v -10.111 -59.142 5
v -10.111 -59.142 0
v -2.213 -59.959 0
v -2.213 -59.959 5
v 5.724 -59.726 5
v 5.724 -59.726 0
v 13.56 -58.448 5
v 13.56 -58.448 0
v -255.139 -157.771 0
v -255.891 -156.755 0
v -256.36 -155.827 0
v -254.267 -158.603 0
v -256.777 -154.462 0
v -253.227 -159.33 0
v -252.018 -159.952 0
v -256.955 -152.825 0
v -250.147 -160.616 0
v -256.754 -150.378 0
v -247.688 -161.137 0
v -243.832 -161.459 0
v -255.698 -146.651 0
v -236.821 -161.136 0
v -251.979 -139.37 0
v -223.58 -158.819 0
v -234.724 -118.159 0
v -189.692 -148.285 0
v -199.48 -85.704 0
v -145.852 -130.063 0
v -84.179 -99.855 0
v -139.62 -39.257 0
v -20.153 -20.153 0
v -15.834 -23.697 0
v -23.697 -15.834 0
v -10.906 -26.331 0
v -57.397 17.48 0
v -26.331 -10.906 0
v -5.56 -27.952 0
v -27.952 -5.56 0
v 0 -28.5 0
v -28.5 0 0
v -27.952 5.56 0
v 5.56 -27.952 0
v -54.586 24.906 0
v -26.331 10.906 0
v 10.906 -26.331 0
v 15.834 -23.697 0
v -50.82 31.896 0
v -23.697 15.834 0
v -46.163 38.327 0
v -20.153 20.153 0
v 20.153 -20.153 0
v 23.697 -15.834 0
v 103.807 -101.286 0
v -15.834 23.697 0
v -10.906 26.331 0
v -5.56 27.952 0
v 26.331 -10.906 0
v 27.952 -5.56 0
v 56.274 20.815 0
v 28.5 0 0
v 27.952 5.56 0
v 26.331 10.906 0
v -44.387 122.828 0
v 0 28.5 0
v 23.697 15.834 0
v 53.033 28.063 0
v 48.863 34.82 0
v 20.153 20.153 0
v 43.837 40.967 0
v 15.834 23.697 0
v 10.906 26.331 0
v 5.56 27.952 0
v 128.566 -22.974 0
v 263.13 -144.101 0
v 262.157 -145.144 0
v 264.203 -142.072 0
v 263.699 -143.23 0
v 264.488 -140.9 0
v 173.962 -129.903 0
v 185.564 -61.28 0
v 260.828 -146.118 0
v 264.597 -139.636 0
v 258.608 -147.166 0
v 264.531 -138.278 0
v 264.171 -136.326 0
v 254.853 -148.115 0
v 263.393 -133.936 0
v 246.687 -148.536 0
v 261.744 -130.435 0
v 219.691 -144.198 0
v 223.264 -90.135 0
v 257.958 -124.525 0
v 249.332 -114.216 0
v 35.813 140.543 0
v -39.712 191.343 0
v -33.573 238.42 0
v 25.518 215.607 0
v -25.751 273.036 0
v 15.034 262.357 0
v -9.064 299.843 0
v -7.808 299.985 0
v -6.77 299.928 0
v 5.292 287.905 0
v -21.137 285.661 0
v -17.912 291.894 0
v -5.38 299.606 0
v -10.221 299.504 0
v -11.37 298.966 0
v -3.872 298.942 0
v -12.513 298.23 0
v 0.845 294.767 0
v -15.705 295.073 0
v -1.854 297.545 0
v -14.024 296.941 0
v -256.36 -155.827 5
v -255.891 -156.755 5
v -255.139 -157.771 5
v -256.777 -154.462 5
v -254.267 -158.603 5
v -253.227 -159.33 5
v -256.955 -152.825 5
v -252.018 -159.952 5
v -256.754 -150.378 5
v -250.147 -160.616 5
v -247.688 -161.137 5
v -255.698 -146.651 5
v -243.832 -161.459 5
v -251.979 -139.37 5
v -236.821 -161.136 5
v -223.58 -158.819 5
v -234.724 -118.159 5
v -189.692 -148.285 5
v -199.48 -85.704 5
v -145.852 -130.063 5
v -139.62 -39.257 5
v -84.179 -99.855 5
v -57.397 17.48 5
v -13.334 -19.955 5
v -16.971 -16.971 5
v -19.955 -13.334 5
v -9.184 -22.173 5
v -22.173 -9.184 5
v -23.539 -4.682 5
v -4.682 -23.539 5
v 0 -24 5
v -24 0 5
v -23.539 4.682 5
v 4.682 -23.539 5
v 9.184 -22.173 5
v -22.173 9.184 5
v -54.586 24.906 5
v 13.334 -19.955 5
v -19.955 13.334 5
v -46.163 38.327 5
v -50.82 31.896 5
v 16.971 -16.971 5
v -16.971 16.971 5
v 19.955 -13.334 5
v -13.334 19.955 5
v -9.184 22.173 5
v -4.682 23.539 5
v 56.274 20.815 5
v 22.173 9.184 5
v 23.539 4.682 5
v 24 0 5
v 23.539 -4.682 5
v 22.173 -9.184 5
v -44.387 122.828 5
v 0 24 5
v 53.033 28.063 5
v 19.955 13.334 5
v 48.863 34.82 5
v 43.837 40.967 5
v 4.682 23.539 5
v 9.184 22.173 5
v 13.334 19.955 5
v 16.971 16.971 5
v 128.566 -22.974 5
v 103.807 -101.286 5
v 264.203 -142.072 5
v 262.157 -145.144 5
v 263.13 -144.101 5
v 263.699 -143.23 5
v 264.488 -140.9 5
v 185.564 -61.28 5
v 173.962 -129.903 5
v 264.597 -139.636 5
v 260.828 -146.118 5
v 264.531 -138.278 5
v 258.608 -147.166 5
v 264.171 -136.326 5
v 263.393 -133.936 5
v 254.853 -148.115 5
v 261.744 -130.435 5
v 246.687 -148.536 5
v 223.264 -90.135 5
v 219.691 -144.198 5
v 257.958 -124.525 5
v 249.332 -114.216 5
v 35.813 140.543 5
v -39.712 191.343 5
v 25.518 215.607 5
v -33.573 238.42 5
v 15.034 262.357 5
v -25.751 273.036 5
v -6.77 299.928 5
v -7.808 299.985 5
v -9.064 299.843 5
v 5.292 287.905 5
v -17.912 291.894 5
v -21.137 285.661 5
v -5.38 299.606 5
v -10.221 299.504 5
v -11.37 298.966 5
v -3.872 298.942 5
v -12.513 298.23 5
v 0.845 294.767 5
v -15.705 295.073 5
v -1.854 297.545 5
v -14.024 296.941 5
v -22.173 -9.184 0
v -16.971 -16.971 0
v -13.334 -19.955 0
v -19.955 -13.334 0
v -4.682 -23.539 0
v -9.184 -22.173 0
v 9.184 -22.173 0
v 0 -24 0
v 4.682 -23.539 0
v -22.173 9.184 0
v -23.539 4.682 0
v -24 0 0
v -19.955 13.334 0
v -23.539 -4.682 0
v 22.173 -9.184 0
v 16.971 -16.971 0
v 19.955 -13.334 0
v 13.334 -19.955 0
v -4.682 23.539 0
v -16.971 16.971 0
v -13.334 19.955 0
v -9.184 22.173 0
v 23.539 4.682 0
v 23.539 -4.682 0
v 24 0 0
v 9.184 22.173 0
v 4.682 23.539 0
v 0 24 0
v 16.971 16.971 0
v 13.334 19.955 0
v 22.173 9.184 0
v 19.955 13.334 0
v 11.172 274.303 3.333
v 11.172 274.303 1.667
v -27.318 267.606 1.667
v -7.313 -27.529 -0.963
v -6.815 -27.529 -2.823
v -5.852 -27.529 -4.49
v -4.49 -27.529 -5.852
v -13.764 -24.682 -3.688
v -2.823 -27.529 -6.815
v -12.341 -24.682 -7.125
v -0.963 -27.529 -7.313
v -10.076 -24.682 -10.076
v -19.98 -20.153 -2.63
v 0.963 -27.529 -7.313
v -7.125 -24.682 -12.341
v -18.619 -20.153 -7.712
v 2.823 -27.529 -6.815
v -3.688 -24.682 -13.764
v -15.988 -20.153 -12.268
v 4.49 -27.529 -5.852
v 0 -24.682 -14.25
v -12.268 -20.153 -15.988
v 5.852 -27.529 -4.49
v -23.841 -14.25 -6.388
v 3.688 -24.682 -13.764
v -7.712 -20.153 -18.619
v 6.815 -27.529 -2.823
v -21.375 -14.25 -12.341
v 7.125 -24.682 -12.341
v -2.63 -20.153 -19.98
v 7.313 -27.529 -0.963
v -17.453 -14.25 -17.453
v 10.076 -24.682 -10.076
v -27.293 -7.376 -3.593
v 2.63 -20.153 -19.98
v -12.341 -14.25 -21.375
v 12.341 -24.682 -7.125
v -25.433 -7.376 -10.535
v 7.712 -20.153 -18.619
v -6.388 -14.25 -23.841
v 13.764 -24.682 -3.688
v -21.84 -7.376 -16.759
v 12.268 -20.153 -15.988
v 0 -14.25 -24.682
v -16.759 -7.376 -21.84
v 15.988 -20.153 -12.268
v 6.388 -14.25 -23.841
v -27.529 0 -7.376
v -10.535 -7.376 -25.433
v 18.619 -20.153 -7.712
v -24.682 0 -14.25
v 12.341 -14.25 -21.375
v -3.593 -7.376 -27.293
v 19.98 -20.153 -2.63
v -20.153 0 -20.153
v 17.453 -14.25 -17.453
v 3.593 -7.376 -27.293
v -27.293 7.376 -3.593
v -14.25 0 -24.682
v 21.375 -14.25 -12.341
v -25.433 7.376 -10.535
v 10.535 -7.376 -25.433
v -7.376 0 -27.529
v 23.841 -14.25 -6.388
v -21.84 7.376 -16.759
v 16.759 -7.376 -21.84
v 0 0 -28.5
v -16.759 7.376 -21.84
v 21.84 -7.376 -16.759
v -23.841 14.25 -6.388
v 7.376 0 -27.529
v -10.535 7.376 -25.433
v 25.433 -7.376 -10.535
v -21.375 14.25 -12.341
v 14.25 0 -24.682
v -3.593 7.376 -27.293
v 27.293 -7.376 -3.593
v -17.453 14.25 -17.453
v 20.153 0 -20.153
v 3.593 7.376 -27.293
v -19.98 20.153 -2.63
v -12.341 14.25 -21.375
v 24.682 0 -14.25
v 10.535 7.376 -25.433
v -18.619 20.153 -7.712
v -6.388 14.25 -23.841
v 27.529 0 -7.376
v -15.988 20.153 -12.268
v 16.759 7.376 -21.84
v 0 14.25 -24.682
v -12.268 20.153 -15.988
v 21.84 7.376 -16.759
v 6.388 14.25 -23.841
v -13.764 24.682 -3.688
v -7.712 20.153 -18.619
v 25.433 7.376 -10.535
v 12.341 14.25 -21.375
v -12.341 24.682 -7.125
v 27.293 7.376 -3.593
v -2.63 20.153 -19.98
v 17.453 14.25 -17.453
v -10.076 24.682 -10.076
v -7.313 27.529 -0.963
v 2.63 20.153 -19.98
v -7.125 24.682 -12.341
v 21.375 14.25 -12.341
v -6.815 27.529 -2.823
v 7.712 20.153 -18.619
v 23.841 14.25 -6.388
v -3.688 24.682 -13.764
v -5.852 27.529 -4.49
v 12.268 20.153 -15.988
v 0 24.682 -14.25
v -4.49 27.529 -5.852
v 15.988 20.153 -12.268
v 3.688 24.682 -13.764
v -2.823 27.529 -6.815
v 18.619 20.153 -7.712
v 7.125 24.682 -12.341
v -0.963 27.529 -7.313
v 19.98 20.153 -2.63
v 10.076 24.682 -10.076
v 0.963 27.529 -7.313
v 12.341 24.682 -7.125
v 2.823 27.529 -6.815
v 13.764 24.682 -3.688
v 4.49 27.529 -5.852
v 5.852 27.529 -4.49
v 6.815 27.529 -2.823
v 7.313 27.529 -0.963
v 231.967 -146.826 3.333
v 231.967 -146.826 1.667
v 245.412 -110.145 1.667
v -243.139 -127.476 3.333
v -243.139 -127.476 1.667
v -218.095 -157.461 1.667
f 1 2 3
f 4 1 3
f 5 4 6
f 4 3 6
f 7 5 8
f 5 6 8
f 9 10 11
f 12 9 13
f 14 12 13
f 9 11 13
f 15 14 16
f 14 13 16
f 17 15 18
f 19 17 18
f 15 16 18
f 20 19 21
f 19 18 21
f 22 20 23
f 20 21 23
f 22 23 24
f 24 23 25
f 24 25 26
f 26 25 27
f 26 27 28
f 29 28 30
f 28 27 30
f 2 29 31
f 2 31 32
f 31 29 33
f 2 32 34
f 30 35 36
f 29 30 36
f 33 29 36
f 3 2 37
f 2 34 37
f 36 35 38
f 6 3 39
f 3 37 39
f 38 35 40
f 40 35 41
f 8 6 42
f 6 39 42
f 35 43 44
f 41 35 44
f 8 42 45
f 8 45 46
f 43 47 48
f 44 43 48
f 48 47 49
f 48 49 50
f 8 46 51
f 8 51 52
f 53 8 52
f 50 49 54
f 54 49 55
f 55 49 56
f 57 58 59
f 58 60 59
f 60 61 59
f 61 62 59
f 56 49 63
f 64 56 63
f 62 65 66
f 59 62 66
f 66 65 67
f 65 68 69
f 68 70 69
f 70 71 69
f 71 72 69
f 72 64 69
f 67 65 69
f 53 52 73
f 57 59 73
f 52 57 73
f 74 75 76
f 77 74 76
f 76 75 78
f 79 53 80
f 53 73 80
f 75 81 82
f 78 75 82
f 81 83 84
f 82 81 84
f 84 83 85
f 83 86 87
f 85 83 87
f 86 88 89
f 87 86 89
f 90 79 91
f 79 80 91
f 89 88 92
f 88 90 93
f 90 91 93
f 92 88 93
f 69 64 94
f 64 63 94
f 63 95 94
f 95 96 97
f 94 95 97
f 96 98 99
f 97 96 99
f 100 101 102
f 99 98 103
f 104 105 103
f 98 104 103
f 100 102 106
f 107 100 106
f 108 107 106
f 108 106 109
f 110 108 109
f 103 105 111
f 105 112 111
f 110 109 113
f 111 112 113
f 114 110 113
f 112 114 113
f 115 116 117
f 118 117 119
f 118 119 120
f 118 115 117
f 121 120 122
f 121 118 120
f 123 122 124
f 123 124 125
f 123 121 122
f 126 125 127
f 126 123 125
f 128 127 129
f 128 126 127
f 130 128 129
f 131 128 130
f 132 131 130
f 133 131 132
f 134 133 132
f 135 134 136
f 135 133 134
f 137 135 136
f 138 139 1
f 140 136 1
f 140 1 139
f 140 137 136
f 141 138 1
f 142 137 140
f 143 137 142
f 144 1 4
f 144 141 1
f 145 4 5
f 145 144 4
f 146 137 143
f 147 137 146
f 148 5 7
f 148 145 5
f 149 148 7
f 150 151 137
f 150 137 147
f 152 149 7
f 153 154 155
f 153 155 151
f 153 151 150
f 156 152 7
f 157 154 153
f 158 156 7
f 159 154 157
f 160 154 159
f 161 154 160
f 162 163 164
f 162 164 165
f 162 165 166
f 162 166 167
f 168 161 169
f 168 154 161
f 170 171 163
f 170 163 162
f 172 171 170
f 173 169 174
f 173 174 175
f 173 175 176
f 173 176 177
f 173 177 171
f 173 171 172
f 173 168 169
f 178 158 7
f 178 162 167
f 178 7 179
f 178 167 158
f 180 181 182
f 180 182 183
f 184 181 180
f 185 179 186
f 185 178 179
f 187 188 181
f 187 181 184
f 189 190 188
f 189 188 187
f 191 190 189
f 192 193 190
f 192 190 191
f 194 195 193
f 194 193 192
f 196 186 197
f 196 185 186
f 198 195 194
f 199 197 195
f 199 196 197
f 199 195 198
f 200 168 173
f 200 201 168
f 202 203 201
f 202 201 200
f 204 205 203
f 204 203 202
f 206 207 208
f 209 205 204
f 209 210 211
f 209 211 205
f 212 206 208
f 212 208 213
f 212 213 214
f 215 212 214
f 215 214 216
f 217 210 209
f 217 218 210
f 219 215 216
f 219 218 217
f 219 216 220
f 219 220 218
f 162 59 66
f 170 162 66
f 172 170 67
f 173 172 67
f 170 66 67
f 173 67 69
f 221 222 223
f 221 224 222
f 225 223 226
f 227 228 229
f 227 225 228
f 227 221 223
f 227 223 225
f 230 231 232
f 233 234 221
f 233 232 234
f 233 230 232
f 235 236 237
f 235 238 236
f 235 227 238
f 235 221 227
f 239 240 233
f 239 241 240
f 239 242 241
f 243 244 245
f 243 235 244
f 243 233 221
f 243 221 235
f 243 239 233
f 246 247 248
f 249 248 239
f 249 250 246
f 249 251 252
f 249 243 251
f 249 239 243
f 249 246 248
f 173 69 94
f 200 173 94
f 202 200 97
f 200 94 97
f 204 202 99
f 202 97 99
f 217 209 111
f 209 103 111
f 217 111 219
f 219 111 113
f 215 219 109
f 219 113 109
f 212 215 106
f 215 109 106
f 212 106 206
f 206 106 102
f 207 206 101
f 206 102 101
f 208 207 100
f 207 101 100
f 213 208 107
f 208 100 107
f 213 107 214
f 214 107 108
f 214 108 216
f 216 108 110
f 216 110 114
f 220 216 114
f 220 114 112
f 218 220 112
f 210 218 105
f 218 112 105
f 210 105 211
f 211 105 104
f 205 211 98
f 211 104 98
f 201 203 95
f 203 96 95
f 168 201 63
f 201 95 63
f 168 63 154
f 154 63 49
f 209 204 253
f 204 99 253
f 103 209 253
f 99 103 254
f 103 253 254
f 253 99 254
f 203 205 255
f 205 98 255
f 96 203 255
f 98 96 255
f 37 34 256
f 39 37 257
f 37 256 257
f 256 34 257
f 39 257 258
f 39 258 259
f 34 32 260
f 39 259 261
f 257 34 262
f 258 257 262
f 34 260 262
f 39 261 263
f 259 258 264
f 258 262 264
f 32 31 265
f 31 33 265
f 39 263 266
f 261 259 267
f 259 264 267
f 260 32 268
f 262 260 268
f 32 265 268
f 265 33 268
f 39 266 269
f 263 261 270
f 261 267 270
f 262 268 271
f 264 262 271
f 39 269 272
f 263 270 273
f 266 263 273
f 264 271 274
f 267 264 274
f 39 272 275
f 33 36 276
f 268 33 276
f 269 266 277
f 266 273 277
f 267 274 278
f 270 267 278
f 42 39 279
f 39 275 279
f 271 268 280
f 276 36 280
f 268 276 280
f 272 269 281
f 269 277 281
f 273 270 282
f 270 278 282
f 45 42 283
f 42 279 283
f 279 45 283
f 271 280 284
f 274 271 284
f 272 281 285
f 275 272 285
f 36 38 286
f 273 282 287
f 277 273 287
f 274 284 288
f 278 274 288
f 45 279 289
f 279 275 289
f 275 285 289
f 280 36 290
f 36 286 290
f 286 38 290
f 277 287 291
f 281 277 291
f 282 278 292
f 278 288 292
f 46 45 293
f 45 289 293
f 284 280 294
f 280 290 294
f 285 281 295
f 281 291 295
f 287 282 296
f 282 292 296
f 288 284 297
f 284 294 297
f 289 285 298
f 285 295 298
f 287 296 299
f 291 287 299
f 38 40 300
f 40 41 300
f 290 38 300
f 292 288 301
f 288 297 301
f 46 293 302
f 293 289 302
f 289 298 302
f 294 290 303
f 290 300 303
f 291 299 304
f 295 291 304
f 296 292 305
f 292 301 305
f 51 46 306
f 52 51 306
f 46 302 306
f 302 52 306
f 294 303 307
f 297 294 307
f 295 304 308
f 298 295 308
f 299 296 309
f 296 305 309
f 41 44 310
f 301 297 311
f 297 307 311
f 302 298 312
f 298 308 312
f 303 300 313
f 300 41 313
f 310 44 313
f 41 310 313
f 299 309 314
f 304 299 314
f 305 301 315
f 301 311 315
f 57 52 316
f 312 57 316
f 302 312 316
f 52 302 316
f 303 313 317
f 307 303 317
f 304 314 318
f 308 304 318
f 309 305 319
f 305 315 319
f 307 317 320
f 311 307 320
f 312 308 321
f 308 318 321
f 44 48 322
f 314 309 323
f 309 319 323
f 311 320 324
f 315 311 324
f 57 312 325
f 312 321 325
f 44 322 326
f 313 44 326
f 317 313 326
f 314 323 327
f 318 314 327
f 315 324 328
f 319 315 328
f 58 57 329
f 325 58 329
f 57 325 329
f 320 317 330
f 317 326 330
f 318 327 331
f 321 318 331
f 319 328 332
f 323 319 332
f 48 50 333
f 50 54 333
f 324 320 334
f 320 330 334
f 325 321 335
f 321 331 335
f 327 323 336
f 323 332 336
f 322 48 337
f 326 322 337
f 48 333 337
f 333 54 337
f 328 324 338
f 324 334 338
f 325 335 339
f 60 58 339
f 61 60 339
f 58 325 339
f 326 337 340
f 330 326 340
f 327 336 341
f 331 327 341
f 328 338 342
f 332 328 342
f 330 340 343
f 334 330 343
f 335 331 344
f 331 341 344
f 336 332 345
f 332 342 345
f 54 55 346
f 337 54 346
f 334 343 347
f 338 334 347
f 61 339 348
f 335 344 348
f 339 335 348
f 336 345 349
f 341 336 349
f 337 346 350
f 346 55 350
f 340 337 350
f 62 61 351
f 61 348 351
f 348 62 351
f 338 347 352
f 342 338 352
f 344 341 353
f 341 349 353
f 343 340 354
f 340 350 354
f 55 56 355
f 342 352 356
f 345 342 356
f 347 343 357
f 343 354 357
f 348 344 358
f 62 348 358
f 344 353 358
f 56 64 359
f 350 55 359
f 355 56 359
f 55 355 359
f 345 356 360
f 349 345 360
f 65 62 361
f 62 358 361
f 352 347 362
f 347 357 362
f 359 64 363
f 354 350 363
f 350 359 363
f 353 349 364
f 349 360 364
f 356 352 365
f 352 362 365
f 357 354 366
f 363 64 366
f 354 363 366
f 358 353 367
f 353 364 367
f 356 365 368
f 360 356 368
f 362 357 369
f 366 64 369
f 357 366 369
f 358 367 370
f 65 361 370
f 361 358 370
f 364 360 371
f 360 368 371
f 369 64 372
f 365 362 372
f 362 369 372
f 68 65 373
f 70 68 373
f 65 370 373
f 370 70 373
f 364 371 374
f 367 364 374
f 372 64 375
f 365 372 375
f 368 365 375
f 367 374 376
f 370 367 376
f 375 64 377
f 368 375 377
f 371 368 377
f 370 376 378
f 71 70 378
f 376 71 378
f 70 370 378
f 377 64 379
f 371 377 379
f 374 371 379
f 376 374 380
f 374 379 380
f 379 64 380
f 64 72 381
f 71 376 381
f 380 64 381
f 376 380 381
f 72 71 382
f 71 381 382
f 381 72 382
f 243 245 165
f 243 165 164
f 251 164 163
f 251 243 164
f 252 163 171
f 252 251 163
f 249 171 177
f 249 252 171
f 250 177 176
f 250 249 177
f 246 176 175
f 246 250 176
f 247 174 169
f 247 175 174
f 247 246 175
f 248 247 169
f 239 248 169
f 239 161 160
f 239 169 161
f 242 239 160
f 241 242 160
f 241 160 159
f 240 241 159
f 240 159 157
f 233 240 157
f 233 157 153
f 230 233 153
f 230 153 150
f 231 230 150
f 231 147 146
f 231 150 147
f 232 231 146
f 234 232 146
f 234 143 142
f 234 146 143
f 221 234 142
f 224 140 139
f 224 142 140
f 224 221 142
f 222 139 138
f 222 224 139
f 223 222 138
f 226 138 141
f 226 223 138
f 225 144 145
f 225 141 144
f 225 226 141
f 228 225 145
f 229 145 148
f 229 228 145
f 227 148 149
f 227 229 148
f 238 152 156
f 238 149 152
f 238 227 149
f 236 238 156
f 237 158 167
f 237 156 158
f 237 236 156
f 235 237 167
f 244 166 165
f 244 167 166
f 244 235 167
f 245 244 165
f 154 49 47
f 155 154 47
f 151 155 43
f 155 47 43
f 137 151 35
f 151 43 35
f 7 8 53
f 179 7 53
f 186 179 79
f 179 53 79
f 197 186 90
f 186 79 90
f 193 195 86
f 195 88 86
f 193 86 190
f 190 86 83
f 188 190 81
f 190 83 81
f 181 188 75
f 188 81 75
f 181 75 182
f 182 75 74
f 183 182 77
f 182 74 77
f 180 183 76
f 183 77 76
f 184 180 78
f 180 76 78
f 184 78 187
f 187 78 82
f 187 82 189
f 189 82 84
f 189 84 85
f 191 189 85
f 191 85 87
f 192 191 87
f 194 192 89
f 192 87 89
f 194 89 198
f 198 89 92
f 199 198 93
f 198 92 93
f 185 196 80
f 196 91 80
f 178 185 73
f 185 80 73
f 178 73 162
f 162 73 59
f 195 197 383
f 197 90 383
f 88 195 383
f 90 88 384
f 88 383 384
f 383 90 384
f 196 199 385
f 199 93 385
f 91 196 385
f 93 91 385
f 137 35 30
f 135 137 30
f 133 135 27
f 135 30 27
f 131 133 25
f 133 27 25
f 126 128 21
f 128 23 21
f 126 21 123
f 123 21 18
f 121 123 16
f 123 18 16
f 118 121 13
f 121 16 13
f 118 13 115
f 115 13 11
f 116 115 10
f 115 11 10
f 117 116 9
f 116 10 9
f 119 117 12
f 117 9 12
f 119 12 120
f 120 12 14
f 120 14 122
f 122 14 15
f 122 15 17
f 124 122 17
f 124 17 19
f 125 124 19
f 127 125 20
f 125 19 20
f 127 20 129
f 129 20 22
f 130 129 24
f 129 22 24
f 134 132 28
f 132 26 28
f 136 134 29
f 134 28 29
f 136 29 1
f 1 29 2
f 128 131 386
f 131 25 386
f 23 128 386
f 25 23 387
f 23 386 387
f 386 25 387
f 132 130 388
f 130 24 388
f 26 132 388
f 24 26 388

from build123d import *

# Parameters (mm, degrees)
SKETCH1_R           = 24
BOSS_EXTRUDE2_DEPTH = 5
CIRPATTERN1_COUNT   = 3
REVOLVE1_ANGLE      = 180


with BuildPart() as part:
    # Sketch1 → Boss-Extrude2 (new body)
    with BuildSketch(Plane.XY):
        with BuildLine():
            ThreePointArc((-46.162964947, 38.327283589), (1.759211062, -59.974204258), (43.837035053, 40.967235174))
            add(Edge.make_bspline(
                [(43.837035053, 40.967235174), (22.573319666, 400.135667747), (-45.629324476, 373.080153996), (-46.162964947, 38.327283589)],
                knots=[0, 0, 0, 0, 1, 1, 1, 1], degree=3))
        make_face()
        Circle(SKETCH1_R, mode=Mode.SUBTRACT)
    boss_extrude2 = extrude(amount=BOSS_EXTRUDE2_DEPTH)

    # CirPattern1: Boss-Extrude2 ×3 about axis
    cirpattern1_axis = Axis((0, 0, 5), (0, 0, 1))
    for i in range(1, CIRPATTERN1_COUNT):
        add(boss_extrude2.rotate(cirpattern1_axis, i * 360 / CIRPATTERN1_COUNT))

    # Sketch2 → Revolve1 (revolve)
    with BuildSketch(Plane.XY):
        with BuildLine():
            Line((0, 28.5), (0, -28.5))
            ThreePointArc((0, -28.5), (-28.5, 0), (0, 28.5))
        make_face()
    revolve(axis=Axis((0, 28.5, 0), (0, -1, 0)), revolution_arc=REVOLVE1_ANGLE)


solid = part.part
